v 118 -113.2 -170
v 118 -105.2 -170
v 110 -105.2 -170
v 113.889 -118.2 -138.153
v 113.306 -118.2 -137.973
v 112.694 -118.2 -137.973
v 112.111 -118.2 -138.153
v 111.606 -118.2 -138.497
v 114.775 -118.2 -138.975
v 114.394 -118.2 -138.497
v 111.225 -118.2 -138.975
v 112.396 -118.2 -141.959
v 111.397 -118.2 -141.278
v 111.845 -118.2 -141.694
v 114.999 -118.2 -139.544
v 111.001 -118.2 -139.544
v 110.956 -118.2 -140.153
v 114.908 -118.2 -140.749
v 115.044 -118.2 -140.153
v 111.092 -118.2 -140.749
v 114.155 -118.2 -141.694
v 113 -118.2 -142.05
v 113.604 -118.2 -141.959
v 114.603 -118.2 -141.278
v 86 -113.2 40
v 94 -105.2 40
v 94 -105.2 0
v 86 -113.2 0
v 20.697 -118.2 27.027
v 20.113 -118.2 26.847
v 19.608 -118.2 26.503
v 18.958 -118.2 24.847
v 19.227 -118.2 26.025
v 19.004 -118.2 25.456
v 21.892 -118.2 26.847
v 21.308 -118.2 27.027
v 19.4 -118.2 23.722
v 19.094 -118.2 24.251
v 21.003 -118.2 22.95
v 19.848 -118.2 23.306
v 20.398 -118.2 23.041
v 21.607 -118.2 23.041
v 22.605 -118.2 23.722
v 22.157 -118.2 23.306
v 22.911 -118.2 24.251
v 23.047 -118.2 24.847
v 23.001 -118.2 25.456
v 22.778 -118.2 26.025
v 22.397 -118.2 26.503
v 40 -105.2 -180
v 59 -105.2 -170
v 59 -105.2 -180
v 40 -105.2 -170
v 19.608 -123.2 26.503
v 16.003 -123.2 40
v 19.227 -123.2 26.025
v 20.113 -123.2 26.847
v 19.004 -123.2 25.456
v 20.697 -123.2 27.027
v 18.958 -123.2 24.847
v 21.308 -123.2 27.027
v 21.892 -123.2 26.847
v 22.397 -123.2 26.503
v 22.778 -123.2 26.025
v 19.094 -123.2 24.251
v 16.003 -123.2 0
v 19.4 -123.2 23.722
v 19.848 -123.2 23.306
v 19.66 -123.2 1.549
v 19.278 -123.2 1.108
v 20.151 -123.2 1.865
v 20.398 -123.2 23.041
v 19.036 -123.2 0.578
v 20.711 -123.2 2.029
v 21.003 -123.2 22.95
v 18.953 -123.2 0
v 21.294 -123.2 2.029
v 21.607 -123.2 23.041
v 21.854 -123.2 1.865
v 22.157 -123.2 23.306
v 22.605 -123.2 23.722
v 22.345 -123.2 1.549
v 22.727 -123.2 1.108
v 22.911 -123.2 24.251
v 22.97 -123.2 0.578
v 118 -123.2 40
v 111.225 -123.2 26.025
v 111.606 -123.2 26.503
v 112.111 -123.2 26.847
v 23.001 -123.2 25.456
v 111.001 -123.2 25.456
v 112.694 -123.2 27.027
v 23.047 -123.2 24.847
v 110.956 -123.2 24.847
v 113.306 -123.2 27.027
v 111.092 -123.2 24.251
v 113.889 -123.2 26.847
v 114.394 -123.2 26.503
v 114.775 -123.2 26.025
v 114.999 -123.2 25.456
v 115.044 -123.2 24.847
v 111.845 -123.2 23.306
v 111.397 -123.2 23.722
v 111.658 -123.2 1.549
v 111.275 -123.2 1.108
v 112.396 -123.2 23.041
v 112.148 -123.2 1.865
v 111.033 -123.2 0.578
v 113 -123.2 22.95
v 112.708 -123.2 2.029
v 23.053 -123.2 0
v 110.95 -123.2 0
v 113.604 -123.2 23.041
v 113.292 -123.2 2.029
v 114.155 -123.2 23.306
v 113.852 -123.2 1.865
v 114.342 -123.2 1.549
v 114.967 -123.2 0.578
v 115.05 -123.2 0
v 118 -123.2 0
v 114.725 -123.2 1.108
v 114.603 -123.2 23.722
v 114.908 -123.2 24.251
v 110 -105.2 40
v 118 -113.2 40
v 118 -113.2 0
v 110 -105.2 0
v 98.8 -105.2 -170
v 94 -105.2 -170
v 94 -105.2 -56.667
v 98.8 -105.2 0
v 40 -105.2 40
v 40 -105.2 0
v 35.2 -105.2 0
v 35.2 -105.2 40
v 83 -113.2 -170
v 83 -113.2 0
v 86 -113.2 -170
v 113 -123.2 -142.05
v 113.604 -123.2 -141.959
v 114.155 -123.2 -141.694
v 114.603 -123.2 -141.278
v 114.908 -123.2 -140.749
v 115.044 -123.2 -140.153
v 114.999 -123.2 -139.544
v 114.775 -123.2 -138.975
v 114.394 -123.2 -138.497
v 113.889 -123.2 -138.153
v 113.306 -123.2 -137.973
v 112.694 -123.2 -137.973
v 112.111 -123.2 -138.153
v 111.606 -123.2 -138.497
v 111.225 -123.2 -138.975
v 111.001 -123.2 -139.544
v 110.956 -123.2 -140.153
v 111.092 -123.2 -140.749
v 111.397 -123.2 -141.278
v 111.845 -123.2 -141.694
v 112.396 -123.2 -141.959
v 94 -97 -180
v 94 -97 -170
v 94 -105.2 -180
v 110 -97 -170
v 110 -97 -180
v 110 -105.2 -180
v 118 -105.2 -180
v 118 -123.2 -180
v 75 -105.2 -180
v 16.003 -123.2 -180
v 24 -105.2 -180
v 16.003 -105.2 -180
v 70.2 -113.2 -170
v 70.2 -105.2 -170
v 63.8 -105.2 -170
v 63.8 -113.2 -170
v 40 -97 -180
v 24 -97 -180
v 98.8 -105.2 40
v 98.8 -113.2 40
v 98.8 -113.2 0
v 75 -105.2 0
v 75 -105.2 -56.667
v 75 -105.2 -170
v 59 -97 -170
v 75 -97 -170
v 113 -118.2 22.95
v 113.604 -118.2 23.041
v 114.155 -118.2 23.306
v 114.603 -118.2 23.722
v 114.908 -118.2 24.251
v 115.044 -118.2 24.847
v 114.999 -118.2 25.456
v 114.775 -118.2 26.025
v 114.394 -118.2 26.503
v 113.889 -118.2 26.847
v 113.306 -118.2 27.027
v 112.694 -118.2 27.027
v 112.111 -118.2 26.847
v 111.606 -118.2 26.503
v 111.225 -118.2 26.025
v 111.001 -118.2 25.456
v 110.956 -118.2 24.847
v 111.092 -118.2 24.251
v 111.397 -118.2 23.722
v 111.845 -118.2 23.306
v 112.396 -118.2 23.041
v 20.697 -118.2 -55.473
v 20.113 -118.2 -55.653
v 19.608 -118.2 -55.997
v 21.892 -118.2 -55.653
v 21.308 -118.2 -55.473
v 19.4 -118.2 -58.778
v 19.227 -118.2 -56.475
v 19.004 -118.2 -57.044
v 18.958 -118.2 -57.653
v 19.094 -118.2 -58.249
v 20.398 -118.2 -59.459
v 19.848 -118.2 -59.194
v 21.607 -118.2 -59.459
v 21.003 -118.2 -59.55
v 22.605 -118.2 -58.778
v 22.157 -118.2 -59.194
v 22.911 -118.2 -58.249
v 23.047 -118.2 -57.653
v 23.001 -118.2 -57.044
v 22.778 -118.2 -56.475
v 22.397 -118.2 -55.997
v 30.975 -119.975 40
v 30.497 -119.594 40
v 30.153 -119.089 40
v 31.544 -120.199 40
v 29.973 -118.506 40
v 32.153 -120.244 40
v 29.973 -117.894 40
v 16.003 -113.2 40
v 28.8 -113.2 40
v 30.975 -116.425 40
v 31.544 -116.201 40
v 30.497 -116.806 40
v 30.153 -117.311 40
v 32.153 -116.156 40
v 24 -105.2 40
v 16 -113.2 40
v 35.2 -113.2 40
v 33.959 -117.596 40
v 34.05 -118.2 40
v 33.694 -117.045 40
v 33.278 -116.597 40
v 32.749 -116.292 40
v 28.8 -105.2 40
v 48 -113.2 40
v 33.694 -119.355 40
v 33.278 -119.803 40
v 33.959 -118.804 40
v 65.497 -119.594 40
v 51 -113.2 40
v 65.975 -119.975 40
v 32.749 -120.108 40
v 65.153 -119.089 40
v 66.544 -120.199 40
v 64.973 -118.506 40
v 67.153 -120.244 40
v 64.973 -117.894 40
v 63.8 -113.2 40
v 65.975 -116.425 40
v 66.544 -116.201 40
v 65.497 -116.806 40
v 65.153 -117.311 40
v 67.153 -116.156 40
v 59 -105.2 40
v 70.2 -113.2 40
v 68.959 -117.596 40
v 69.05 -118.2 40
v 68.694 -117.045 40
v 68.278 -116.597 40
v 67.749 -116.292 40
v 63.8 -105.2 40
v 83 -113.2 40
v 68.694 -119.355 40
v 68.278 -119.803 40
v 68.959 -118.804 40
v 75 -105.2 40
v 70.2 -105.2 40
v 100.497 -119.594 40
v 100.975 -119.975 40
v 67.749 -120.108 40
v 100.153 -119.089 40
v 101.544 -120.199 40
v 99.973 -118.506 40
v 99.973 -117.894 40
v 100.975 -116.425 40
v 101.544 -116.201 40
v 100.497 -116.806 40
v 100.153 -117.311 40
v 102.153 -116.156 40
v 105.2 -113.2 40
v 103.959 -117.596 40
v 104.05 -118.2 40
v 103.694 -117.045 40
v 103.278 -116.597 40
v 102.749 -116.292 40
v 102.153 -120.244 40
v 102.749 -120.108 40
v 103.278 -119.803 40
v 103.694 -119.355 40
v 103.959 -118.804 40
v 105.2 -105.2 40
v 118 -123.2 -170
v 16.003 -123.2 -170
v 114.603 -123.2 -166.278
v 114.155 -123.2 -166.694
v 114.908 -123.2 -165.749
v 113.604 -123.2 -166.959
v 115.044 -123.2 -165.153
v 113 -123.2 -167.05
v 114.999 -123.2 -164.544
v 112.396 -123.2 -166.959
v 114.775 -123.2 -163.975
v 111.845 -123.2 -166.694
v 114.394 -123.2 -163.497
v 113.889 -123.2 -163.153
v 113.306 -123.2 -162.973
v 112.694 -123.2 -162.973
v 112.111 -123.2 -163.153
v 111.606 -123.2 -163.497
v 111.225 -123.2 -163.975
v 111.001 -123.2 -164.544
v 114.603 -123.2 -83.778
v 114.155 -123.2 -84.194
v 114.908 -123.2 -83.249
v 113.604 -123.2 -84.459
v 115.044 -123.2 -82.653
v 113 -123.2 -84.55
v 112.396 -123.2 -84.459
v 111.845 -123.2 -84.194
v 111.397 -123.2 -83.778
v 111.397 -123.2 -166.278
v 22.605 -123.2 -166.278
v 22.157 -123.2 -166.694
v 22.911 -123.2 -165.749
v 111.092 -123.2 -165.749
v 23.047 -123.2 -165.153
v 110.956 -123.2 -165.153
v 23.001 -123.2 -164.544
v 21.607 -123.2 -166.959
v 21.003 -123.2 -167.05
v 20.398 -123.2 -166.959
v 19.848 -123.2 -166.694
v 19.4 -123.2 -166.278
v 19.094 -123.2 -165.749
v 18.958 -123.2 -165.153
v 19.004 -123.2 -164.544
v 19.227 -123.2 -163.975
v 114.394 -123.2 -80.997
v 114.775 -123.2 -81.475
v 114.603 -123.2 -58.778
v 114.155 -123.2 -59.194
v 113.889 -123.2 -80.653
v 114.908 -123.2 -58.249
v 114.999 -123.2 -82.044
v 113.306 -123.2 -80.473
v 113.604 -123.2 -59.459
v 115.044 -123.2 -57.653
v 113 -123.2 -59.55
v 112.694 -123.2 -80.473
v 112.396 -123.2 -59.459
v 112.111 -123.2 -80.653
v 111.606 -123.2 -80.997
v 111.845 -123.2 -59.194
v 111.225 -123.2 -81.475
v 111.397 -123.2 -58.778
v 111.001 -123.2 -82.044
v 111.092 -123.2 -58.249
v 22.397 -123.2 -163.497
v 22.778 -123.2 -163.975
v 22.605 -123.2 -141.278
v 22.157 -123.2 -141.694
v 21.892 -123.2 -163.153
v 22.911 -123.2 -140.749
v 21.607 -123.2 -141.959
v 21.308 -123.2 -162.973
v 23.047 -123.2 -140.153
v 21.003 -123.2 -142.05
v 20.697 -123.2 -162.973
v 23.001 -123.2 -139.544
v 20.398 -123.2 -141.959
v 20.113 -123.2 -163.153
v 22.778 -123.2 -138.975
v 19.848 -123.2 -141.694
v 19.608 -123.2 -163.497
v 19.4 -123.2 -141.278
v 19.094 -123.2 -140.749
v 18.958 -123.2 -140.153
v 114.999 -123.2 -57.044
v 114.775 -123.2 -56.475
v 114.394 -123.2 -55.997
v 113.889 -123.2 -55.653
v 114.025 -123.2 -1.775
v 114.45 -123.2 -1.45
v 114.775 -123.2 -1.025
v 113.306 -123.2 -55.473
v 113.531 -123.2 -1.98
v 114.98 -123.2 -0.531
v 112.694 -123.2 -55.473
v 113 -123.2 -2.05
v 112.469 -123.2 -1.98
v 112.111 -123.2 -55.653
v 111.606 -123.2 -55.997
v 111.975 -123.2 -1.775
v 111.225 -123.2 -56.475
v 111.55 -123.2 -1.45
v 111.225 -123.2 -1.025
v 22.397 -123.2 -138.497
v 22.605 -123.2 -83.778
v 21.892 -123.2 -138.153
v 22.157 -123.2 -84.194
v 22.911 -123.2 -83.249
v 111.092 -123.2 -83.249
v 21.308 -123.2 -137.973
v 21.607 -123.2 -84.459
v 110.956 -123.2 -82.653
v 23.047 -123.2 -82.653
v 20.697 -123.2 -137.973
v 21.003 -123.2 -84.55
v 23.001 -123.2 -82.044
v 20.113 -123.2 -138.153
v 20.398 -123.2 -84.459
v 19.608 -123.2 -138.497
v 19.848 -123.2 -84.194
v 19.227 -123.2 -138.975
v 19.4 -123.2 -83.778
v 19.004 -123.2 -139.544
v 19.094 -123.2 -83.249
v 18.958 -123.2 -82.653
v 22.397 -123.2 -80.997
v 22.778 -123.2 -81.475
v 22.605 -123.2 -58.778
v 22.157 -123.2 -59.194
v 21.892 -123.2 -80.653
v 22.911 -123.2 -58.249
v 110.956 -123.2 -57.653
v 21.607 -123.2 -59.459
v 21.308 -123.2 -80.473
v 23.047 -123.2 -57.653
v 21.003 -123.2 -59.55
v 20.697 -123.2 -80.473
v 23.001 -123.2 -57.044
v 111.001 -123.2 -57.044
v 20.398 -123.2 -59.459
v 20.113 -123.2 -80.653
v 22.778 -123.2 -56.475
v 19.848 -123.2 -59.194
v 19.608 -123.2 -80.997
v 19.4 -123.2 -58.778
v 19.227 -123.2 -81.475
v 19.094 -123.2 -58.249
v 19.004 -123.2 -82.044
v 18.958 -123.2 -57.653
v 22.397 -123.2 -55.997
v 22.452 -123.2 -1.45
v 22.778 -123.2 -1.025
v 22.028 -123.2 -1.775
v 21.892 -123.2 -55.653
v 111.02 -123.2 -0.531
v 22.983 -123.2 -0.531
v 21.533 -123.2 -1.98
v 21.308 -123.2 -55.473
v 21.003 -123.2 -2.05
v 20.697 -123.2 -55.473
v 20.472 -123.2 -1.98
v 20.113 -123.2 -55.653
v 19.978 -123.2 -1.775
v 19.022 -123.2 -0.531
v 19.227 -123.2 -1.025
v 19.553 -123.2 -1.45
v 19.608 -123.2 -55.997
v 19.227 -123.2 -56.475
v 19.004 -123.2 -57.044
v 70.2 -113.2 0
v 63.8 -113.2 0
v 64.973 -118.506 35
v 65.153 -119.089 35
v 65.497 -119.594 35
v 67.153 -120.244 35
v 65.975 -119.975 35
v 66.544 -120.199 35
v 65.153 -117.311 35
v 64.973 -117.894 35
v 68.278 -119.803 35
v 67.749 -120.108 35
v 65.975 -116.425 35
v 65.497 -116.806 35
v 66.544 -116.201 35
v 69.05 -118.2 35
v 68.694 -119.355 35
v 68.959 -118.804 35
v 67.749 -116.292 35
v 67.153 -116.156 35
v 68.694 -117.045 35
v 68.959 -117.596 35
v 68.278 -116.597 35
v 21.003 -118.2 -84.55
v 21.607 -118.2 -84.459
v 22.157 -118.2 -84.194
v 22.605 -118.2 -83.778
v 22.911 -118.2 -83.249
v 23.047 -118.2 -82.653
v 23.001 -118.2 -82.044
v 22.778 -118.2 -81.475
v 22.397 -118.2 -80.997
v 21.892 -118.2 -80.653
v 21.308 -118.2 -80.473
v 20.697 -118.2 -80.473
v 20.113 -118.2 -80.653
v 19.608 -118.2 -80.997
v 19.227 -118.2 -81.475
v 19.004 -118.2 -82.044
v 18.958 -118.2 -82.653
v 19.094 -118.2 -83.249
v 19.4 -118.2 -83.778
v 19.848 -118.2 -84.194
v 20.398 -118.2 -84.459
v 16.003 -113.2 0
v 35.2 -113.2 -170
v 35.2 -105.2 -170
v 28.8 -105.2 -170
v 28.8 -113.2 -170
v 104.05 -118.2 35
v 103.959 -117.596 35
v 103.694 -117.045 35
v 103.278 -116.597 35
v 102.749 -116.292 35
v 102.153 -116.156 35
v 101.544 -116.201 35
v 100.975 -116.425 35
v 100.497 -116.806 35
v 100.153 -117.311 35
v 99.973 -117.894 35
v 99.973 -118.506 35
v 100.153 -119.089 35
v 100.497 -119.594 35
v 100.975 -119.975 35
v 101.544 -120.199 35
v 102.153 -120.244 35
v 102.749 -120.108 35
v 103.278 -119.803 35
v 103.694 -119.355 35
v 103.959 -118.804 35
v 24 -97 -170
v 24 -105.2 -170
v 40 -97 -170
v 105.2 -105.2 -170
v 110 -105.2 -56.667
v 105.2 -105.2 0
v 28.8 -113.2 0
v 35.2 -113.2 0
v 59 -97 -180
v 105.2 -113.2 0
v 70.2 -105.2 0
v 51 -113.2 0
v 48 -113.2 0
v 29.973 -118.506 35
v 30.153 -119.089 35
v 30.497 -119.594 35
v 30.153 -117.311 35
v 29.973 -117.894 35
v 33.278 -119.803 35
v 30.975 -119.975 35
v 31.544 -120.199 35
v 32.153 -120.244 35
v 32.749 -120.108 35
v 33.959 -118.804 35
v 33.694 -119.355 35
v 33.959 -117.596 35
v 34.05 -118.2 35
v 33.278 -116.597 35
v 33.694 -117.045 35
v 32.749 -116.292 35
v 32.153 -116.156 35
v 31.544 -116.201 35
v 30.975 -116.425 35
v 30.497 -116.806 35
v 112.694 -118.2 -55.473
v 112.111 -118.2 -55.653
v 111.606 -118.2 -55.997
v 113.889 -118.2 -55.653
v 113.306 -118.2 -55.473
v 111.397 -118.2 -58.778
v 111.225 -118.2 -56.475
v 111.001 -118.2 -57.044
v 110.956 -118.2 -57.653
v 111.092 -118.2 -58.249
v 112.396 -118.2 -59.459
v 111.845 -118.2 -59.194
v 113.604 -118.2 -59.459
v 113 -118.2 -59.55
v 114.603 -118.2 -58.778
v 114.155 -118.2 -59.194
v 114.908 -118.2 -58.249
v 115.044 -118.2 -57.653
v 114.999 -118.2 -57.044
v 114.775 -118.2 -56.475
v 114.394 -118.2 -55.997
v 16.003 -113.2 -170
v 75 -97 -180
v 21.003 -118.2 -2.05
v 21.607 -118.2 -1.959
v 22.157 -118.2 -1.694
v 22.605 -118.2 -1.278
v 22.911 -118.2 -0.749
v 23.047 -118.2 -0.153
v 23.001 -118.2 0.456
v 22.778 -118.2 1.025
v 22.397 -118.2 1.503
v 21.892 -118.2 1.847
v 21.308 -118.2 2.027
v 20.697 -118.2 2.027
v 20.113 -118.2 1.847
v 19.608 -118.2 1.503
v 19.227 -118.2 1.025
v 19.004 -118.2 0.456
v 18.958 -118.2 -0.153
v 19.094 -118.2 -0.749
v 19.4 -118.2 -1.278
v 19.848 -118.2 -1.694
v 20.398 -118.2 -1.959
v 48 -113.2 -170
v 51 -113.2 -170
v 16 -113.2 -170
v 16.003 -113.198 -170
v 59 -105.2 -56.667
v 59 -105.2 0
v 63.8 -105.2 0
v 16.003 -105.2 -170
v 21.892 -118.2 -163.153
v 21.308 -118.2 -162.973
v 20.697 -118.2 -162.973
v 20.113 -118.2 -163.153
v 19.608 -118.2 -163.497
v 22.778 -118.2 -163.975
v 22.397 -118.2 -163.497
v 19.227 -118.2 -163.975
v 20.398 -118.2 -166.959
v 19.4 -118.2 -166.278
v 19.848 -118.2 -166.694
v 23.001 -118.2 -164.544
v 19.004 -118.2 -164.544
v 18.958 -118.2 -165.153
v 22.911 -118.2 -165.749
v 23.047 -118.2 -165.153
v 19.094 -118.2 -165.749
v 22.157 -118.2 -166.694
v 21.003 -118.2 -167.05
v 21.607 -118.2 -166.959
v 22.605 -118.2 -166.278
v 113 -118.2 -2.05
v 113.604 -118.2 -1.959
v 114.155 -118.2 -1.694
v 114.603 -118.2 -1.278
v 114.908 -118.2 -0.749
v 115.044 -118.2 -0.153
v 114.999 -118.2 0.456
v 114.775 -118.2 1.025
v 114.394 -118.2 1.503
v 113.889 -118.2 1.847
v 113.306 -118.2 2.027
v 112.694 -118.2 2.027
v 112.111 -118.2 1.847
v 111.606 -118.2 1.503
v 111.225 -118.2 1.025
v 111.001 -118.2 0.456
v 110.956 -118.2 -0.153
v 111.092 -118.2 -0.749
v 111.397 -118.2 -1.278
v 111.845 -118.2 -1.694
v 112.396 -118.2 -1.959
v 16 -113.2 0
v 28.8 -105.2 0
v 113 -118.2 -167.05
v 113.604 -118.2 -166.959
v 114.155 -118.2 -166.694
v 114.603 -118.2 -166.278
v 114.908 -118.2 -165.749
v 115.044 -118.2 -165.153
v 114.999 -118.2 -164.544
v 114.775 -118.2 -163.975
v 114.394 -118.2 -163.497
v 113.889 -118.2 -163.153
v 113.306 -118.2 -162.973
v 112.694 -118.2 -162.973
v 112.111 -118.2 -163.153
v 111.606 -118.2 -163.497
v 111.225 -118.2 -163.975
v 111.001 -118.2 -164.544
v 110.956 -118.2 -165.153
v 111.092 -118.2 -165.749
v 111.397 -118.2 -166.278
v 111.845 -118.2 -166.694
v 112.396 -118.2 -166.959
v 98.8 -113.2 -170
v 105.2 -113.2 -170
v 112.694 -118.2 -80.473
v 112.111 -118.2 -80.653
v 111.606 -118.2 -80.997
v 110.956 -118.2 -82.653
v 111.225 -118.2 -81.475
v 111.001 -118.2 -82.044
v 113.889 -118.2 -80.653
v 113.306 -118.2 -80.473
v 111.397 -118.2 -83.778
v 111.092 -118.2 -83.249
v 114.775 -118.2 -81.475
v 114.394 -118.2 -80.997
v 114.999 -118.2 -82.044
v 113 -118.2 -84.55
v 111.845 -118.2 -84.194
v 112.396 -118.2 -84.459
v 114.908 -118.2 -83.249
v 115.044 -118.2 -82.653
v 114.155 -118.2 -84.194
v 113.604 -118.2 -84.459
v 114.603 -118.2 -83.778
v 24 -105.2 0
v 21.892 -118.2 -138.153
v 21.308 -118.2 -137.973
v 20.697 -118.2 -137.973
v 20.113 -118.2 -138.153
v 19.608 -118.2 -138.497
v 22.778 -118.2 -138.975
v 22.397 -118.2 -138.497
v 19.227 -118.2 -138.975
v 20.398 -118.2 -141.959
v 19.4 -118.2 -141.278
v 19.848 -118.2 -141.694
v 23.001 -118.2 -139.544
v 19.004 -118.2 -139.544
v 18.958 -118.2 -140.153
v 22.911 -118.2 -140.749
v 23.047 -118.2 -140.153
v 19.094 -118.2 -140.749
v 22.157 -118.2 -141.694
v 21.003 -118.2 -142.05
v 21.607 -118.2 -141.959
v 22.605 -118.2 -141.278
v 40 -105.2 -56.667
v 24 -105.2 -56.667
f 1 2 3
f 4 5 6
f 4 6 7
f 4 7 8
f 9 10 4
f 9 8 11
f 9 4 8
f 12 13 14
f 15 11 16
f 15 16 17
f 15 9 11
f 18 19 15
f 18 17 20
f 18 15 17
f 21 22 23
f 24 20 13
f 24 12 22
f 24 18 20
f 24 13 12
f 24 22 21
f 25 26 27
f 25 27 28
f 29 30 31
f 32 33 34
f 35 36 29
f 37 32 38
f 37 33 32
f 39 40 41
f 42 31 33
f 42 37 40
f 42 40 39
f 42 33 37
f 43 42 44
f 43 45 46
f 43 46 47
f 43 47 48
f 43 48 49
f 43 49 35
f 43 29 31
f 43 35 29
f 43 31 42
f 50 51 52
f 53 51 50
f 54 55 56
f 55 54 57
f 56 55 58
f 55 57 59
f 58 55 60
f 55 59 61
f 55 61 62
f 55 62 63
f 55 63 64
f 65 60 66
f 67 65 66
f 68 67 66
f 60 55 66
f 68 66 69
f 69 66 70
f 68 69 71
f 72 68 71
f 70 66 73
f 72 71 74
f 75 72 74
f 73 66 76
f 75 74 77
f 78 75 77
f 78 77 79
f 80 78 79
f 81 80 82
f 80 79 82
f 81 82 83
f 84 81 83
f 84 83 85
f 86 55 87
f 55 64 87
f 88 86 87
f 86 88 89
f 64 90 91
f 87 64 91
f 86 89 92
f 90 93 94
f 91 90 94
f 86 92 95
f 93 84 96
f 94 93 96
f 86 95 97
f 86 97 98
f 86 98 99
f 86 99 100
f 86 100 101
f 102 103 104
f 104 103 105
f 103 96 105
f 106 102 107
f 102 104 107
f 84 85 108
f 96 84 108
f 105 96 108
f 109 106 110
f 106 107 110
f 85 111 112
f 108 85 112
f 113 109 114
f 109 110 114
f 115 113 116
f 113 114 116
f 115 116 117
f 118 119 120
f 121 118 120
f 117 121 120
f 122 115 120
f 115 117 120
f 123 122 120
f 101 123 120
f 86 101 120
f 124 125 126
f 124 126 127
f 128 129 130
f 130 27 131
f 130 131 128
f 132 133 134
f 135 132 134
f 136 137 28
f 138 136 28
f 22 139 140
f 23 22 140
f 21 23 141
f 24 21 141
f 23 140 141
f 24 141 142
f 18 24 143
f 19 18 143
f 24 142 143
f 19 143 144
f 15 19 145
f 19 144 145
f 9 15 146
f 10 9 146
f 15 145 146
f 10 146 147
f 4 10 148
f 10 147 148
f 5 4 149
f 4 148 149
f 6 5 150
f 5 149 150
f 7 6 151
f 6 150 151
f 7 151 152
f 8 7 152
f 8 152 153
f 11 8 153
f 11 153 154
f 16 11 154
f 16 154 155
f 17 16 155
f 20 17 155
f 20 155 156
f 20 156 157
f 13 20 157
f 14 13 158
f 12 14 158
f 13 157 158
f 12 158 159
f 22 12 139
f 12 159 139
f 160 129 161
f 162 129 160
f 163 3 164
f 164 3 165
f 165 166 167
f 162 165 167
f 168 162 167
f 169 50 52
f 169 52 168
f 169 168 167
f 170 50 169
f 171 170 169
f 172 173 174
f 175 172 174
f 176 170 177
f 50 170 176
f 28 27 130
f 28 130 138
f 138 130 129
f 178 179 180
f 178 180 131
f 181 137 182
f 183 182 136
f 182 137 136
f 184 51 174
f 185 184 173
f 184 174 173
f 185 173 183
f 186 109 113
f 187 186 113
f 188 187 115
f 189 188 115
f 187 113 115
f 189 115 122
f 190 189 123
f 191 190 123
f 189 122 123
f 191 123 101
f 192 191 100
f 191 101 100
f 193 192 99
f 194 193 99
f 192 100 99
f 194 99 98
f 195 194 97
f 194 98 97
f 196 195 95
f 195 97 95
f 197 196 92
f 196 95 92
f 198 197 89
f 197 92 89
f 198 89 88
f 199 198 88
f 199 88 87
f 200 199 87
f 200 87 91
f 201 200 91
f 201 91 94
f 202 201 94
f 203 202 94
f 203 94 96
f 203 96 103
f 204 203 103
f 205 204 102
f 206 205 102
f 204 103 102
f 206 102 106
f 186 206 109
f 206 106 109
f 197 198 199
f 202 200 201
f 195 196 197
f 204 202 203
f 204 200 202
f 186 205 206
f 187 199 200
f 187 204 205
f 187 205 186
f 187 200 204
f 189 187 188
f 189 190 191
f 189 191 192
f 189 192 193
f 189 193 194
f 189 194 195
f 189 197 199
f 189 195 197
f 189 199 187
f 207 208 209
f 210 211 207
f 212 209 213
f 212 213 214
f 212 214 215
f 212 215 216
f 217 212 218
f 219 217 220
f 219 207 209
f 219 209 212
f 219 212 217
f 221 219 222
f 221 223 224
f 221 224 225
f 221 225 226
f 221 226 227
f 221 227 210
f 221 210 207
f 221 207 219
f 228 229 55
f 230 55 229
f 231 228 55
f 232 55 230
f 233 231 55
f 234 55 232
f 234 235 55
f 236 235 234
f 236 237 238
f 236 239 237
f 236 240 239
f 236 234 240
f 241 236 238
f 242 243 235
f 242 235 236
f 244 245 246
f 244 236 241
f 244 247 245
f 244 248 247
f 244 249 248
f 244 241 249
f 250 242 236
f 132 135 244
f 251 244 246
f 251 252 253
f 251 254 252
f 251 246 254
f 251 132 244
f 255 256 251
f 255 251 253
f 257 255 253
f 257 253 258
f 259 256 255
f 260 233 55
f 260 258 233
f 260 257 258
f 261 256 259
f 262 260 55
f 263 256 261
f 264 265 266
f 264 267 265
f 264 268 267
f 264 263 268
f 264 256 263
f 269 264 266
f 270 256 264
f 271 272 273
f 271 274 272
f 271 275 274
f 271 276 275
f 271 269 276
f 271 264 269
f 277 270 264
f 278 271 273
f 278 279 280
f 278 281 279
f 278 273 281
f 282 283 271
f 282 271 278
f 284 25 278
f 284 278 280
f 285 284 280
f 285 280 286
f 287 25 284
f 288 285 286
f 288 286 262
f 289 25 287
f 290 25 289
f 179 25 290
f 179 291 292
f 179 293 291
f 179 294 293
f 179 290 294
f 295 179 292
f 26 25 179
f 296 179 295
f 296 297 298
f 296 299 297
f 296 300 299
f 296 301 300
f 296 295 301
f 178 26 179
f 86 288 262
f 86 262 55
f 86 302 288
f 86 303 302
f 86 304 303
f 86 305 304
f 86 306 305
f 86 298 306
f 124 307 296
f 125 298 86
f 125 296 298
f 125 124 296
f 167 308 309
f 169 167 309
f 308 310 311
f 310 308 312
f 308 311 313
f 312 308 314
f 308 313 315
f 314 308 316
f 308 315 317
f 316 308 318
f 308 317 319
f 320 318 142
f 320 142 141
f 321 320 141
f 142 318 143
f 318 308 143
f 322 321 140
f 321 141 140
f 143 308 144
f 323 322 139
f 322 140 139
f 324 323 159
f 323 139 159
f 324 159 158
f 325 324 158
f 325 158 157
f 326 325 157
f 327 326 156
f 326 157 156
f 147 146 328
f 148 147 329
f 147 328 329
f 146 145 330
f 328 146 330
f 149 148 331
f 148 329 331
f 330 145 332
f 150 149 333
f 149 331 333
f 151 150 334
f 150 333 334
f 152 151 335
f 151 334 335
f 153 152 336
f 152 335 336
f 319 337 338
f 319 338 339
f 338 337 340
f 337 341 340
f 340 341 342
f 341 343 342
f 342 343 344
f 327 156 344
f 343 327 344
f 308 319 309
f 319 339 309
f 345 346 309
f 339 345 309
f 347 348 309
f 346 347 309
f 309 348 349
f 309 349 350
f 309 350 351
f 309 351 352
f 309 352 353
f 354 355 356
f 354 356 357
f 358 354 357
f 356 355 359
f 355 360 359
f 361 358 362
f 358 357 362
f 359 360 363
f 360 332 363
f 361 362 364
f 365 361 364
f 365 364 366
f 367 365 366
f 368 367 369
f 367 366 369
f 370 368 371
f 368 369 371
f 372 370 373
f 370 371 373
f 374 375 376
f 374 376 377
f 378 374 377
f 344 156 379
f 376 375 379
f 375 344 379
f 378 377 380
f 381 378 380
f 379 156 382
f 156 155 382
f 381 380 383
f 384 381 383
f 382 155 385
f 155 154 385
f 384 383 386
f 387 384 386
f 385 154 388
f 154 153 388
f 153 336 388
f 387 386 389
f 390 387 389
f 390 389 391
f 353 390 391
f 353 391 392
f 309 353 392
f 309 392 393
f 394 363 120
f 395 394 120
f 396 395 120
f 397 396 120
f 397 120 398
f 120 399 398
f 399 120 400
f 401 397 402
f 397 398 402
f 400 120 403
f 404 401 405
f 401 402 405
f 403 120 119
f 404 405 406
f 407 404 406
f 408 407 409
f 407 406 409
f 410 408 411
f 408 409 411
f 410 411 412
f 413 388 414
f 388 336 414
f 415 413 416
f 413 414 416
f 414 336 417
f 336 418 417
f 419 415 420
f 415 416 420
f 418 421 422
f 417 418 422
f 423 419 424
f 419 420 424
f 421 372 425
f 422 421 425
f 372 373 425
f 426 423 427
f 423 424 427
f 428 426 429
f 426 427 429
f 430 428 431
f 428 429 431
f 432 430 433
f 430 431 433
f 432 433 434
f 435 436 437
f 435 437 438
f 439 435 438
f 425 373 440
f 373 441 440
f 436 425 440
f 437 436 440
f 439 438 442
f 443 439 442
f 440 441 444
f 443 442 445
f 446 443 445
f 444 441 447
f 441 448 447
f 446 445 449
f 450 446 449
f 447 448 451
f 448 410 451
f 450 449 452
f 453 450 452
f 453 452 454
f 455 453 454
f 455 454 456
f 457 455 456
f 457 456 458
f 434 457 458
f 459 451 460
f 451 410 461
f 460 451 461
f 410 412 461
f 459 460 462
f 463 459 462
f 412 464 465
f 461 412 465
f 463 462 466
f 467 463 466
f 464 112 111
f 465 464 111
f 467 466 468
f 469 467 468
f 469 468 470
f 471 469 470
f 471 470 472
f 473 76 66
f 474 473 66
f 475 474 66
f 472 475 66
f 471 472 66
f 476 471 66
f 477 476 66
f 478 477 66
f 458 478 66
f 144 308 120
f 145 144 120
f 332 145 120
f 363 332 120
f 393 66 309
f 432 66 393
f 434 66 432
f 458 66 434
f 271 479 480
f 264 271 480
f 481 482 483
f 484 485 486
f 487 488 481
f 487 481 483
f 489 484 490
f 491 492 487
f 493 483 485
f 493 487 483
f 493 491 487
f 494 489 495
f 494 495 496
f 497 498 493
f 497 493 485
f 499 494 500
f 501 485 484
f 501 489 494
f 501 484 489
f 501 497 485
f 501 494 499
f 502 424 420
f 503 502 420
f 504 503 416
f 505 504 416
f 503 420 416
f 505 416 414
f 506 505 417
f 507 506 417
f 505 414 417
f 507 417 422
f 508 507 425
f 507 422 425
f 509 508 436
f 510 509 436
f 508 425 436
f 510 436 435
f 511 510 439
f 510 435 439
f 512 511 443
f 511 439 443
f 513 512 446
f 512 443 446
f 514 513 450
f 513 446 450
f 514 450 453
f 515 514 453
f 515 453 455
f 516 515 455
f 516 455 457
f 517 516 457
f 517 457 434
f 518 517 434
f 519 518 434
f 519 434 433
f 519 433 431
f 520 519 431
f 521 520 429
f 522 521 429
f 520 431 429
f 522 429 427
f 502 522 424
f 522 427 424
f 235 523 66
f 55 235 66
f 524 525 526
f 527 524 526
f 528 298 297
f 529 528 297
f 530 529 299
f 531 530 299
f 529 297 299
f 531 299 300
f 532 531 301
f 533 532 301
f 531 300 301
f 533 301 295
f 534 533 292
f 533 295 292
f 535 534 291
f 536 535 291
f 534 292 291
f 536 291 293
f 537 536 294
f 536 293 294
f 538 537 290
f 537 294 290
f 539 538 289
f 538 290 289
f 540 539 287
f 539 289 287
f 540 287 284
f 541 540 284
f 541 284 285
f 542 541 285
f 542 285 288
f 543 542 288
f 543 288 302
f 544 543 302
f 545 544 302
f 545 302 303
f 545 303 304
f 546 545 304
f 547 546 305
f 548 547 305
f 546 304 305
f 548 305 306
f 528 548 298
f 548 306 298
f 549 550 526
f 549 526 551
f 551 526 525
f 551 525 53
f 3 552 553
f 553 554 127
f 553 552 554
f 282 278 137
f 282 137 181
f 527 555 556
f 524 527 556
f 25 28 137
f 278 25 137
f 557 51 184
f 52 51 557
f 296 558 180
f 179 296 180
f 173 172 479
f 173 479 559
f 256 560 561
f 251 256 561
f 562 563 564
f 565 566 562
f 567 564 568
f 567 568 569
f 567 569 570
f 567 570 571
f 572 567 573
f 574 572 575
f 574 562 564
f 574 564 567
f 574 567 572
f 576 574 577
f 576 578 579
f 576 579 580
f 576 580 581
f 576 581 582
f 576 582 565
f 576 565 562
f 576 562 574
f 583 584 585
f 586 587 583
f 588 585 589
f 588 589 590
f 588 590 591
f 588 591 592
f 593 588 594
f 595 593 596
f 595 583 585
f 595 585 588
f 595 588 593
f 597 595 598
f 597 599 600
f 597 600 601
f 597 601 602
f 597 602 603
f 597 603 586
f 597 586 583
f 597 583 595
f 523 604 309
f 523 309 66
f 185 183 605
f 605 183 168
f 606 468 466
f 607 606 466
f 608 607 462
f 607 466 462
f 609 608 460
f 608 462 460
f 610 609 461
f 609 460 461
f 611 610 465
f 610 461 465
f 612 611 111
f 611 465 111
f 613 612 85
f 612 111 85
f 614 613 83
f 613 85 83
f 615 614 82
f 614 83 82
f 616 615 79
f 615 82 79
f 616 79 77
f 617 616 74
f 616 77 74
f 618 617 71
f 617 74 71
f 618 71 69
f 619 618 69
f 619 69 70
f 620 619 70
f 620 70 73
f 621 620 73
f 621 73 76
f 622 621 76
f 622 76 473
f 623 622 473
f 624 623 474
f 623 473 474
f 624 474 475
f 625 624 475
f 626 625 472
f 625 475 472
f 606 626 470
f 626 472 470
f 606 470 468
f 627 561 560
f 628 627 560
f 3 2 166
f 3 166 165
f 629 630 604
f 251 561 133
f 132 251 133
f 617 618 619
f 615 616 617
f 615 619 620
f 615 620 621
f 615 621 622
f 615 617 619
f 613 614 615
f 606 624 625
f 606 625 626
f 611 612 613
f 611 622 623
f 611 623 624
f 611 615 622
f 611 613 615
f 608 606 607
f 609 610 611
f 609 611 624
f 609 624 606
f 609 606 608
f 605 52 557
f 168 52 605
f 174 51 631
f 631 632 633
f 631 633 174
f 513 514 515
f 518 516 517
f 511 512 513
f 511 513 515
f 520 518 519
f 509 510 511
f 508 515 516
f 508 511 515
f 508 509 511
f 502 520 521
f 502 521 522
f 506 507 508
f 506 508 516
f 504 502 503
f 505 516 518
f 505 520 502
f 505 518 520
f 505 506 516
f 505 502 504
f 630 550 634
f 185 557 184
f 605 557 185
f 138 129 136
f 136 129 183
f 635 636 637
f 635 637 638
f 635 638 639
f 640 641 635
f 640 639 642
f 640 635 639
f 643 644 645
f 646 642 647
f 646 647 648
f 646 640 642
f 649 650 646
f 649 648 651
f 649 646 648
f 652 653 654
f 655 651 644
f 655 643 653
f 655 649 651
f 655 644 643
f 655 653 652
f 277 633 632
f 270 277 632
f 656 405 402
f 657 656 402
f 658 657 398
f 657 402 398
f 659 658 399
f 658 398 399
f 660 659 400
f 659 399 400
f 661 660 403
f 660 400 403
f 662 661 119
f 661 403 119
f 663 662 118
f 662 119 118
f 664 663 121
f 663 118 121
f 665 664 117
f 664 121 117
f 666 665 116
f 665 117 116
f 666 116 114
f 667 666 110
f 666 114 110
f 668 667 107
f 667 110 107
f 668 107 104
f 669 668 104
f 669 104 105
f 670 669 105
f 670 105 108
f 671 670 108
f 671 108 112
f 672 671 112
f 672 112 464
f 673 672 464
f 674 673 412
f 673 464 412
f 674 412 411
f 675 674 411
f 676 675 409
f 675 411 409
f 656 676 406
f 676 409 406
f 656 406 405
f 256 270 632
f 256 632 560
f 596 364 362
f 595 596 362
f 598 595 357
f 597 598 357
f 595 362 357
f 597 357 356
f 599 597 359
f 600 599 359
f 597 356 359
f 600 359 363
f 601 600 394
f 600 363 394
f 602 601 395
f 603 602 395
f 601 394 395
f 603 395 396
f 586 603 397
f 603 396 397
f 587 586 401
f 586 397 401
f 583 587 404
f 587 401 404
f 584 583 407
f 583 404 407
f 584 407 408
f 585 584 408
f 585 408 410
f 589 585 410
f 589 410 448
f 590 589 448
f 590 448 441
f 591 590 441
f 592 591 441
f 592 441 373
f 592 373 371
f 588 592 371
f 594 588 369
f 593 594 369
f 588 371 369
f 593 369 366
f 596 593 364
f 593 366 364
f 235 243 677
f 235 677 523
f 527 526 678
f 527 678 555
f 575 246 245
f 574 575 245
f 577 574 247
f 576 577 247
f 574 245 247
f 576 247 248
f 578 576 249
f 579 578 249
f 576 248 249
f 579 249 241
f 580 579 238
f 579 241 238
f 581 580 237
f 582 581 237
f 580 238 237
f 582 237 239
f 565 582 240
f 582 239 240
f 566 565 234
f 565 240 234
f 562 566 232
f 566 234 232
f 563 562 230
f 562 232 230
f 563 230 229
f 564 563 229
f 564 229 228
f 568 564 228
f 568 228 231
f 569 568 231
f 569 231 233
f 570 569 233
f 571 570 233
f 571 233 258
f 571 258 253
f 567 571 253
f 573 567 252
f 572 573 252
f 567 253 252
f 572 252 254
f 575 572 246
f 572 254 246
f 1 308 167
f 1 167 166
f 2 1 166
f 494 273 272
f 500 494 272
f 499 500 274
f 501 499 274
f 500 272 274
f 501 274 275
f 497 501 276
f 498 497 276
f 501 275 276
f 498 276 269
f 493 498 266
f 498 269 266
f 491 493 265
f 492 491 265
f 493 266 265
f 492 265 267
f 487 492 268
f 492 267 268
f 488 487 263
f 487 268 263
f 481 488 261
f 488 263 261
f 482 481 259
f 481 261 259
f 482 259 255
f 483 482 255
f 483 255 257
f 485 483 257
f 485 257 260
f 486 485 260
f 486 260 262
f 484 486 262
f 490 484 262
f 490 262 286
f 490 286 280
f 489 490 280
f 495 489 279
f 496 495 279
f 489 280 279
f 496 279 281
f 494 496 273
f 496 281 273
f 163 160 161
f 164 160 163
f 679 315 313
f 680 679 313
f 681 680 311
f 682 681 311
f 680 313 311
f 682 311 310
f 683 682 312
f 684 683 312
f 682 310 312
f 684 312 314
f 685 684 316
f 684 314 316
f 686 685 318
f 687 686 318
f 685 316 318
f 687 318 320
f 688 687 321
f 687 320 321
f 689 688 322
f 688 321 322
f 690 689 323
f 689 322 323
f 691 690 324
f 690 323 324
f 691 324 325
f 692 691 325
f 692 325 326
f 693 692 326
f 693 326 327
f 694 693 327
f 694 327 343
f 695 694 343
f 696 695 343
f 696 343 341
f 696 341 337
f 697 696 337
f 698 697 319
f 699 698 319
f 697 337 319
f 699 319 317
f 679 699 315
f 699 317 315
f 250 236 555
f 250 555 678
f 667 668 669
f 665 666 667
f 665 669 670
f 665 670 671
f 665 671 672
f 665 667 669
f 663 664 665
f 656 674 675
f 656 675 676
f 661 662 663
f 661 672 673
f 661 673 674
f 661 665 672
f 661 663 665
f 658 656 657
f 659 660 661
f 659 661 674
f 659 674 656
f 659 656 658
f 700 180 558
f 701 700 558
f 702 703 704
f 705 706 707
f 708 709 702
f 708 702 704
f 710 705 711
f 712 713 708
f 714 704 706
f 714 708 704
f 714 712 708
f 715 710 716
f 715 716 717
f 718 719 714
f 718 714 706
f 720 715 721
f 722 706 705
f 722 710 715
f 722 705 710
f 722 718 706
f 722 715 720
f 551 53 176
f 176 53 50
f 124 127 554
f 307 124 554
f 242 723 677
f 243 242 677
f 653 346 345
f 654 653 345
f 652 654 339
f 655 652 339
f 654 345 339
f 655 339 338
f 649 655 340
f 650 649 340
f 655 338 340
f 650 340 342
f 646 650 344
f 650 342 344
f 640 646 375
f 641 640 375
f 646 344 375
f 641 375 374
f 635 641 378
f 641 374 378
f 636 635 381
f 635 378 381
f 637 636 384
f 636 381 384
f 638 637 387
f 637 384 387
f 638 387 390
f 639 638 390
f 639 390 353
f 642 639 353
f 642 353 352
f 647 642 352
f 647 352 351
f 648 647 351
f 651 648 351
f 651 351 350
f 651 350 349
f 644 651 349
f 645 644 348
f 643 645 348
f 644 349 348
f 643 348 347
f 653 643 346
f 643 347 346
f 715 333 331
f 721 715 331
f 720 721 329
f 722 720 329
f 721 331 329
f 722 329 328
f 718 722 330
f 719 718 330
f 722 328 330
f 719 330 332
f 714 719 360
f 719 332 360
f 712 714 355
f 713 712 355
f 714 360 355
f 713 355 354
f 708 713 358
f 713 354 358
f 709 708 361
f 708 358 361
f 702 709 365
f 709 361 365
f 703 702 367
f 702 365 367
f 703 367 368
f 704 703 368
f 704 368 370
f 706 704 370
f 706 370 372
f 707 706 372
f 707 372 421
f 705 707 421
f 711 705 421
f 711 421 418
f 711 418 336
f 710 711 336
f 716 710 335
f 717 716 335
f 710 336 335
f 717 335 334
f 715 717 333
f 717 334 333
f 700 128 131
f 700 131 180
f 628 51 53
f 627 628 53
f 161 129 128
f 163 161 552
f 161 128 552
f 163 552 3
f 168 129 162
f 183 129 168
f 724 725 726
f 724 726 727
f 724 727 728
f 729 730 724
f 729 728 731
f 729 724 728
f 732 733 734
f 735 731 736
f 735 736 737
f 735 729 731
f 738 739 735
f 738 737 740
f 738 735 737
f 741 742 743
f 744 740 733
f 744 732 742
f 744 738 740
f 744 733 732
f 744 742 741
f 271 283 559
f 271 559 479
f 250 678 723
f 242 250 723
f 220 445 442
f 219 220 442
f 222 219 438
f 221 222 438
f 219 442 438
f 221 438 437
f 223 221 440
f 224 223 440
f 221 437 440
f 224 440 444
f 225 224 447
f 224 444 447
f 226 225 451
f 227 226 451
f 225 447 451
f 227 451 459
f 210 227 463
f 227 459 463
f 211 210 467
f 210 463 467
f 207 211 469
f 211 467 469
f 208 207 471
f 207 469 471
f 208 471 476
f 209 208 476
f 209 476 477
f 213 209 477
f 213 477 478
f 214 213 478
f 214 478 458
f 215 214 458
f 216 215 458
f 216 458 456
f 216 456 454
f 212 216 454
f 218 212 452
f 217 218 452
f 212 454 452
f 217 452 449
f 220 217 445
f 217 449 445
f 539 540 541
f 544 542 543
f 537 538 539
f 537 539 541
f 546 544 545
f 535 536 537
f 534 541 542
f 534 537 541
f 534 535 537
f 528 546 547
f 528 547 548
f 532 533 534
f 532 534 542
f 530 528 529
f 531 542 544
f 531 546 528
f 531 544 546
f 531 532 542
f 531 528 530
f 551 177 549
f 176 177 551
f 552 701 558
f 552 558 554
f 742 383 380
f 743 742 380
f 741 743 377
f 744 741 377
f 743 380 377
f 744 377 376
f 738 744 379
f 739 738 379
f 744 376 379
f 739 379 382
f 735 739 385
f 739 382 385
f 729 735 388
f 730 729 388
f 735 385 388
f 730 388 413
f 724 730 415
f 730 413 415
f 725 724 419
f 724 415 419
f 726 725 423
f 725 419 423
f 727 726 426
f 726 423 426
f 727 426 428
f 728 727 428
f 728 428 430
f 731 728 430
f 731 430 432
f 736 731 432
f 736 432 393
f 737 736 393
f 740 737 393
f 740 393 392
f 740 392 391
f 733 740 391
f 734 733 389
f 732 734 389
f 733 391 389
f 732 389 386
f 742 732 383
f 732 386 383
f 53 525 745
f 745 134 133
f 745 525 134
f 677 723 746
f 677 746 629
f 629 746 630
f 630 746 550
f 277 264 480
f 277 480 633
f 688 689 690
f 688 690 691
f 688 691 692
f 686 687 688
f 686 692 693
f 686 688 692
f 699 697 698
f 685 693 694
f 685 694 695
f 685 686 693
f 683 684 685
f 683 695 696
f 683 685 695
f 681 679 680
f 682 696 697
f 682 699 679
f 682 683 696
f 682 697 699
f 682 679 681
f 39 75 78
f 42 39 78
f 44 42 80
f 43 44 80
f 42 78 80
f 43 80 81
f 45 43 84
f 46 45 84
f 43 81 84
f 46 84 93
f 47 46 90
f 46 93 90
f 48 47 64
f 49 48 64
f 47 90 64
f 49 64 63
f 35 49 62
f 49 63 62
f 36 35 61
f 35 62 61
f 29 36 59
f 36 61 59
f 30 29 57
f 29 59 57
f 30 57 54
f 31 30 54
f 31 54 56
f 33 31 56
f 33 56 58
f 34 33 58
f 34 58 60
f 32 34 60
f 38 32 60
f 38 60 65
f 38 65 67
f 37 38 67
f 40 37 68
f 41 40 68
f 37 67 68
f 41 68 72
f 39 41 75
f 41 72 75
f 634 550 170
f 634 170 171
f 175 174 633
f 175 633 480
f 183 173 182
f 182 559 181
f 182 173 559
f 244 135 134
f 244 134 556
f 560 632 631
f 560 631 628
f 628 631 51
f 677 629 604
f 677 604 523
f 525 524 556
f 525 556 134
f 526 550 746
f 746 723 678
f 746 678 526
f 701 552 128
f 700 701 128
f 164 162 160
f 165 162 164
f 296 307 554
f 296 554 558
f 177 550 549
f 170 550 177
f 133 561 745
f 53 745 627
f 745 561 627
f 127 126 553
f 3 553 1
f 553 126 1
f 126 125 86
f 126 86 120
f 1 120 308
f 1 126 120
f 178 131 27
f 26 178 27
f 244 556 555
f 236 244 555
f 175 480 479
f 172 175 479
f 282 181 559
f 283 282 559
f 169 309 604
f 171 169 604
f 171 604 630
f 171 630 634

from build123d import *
from build123d.topology import SkipClean

# Parameters (mm, degrees)
EXTRUDE_1_DEPTH     = 170
CHAMFER_1_SIZE      = 8
SKETCH_2_W          = 170
SKETCH_2_H          = 10
CUT_EXTRUDE_1_DEPTH = 0.84
EXTRUDE_2_DEPTH     = 80
SKETCH_4_W          = 250
SKETCH_4_H          = 10
CUT_EXTRUDE_2_DEPTH = 12
SKETCH_5_W          = 101.997424074
SKETCH_5_H          = 18
EXTRUDE_3_DEPTH     = 10
SKETCH_6_R          = 2.05
CUT_EXTRUDE_3_DEPTH = 5
SKETCH_7_W          = 16
SKETCH_7_H          = 10
EXTRUDE_4_DEPTH     = 8.2
CUT_EXTRUDE_5_DEPTH = 40
SKETCH_11_R         = 2.05
CUT_EXTRUDE_6_DEPTH = 5


with BuildPart() as part:
    # 草图1 → 凸台-拉伸1 (new body)
    with BuildSketch(Plane.XY):
        Polygon((28.8, -113.2), (35.2, -113.2), (35.2, -105.2), (40, -105.2), (40, -113.2), (59, -113.2), (59, -105.2), (63.8, -105.2), (63.8, -113.2), (70.2, -113.2), (70.2, -105.2), (75, -105.2), (75, -113.2), (94, -113.2), (94, -105.2), (98.8, -105.2), (98.8, -113.2), (105.2, -113.2), (105.2, -105.2), (110, -105.2), (110, -113.2), (130, -113.2), (130, -123.2), (15.162575926, -123.2), (15.162575926, -113.2), (24, -113.2), (24, -105.2), (28.8, -105.2), align=None)
    extrude(amount=-EXTRUDE_1_DEPTH)

    # 倒角1
    chamfer_1_edges = [part.edges().sort_by_distance(p)[0] for p in [
        (24, -113.2, -85),
        (110, -113.2, -85),
        (94, -113.2, -85),
        (75, -113.2, -85),
        (59, -113.2, -85),
        (40, -113.2, -85),
    ]]
    chamfer(chamfer_1_edges, length=CHAMFER_1_SIZE - 0.0001)  # a hair under: the kernel refuses the full size

    # 草图2 → 切除-拉伸1 (cut)
    with BuildSketch(Plane.ZY.offset(-15.162575926)):
        with Locations((-85, -118.2)):
            Rectangle(SKETCH_2_W, SKETCH_2_H)
    extrude(amount=-CUT_EXTRUDE_1_DEPTH, mode=Mode.SUBTRACT)

    # 草图3 → 凸台-拉伸2 (add)
    with SkipClean():  # the faces are left unmerged after this step: merging them gives an invalid solid
        with BuildSketch(Plane.XY):
            Polygon((24, -105.2), (16, -113.2), (16.002575926, -113.2), (16.002575926, -123.2), (130, -123.2), (130, -113.2), (118, -113.2), (110, -105.2), (105.2, -105.2), (105.2, -113.2), (98.8, -113.2), (98.8, -105.2), (94, -105.2), (86, -113.2), (83, -113.2), (75, -105.2), (70.2, -105.2), (70.2, -113.2), (63.8, -113.2), (63.8, -105.2), (59, -105.2), (51, -113.2), (48, -113.2), (40, -105.2), (35.2, -105.2), (35.2, -113.2), (28.8, -113.2), (28.8, -105.2), align=None)
        extrude(amount=EXTRUDE_2_DEPTH)

    # 草图4 → 切除-拉伸2 (cut)
    with SkipClean():  # the faces are left unmerged after this step: merging them gives an invalid solid
        with BuildSketch(Plane(origin=(130, 0, 0), x_dir=(0, 0, -1), z_dir=(1, 0, 0))):
            with Locations((45, -118.2)):
                Rectangle(SKETCH_4_W, SKETCH_4_H)
        extrude(amount=-CUT_EXTRUDE_2_DEPTH, mode=Mode.SUBTRACT)

    # 草图5 → 凸台-拉伸3 (add)
    with SkipClean():  # the faces are left unmerged after this step: merging them gives an invalid solid
        with BuildSketch(Plane(origin=(0, 0, -170), x_dir=(-1, 0, 0), z_dir=(0, 0, -1))):
            with Locations((-67.001287963, -114.2)):
                Rectangle(SKETCH_5_W, SKETCH_5_H)
        extrude(amount=EXTRUDE_3_DEPTH)

    # 草图6 → 切除-拉伸3 (cut)
    with SkipClean():  # the faces are left unmerged after this step: merging them gives an invalid solid
        with BuildSketch(Plane.XZ.offset(123.2)):
            with Locations(Location((21.002575926, 25, 0), (0, 0, 270))):
                Circle(SKETCH_6_R)
            with Locations(Location((21.002575926, 0, 0), (0, 0, 270))):
                Circle(SKETCH_6_R)
            with Locations(Location((21.002575926, -57.5, 0), (0, 0, 270))):
                Circle(SKETCH_6_R)
            with Locations(Location((21.002575926, -82.5, 0), (0, 0, 270))):
                Circle(SKETCH_6_R)
            with Locations(Location((21.002575926, -140, 0), (0, 0, 270))):
                Circle(SKETCH_6_R)
            with Locations(Location((21.002575926, -165, 0), (0, 0, 270))):
                Circle(SKETCH_6_R)
            with Locations(Location((113, -140, 0), (0, 0, 270))):
                Circle(SKETCH_6_R)
            with Locations(Location((113, -82.5, 0), (0, 0, 270))):
                Circle(SKETCH_6_R)
            with Locations(Location((113, -57.5, 0), (0, 0, 270))):
                Circle(SKETCH_6_R)
            with Locations(Location((113, 0, 0), (0, 0, 270))):
                Circle(SKETCH_6_R)
            with Locations(Location((113, 25, 0), (0, 0, 270))):
                Circle(SKETCH_6_R)
            with Locations(Location((113, -165, 0), (0, 0, 270))):
                Circle(SKETCH_6_R)
        extrude(amount=-CUT_EXTRUDE_3_DEPTH, mode=Mode.SUBTRACT)

    # 草图7 → 凸台-拉伸4 (add)
    with SkipClean():  # the faces are left unmerged after this step: merging them gives an invalid solid
        with BuildSketch(Plane(origin=(0, -105.2, 0), x_dir=(1, 0, 0), z_dir=(0, 1, 0))):
            with Locations((102, 175)):
                Rectangle(SKETCH_7_W, SKETCH_7_H)
            with Locations((67, 175)):
                Rectangle(SKETCH_7_W, SKETCH_7_H)
            with Locations((32, 175)):
                Rectangle(SKETCH_7_W, SKETCH_7_H)
        extrude(amount=EXTRUDE_4_DEPTH)

    # 草图10 → 切除-拉伸5 (cut)
    with SkipClean():  # the faces are left unmerged after this step: merging them gives an invalid solid
        with BuildSketch(Plane.XY.offset(80)):
            Polygon((16.002575926, -123.2), (118, -123.2), (118, -113.2), (110, -105.2), (105.2, -105.2), (105.2, -113.2), (98.8, -113.2), (98.8, -105.2), (94, -105.2), (86, -113.2), (83, -113.2), (75, -105.2), (70.2, -105.2), (70.2, -113.2), (63.8, -113.2), (63.8, -105.2), (59, -105.2), (51, -113.2), (48, -113.2), (40, -105.2), (35.2, -105.2), (35.2, -113.2), (28.8, -113.2), (28.8, -105.2), (24, -105.2), (16, -113.2), (16.002575926, -113.2), align=None)
        extrude(amount=-CUT_EXTRUDE_5_DEPTH, mode=Mode.SUBTRACT)

    # 草图11 → 切除-拉伸6 (cut)
    with SkipClean():  # the faces are left unmerged after this step: merging them gives an invalid solid
        with BuildSketch(Plane.XY.offset(40)):
            with Locations((32, -118.2)):
                Circle(SKETCH_11_R)
            with Locations((67, -118.2)):
                Circle(SKETCH_11_R)
            with Locations((102, -118.2)):
                Circle(SKETCH_11_R)
        extrude(amount=-CUT_EXTRUDE_6_DEPTH, mode=Mode.SUBTRACT)


solid = part.part
